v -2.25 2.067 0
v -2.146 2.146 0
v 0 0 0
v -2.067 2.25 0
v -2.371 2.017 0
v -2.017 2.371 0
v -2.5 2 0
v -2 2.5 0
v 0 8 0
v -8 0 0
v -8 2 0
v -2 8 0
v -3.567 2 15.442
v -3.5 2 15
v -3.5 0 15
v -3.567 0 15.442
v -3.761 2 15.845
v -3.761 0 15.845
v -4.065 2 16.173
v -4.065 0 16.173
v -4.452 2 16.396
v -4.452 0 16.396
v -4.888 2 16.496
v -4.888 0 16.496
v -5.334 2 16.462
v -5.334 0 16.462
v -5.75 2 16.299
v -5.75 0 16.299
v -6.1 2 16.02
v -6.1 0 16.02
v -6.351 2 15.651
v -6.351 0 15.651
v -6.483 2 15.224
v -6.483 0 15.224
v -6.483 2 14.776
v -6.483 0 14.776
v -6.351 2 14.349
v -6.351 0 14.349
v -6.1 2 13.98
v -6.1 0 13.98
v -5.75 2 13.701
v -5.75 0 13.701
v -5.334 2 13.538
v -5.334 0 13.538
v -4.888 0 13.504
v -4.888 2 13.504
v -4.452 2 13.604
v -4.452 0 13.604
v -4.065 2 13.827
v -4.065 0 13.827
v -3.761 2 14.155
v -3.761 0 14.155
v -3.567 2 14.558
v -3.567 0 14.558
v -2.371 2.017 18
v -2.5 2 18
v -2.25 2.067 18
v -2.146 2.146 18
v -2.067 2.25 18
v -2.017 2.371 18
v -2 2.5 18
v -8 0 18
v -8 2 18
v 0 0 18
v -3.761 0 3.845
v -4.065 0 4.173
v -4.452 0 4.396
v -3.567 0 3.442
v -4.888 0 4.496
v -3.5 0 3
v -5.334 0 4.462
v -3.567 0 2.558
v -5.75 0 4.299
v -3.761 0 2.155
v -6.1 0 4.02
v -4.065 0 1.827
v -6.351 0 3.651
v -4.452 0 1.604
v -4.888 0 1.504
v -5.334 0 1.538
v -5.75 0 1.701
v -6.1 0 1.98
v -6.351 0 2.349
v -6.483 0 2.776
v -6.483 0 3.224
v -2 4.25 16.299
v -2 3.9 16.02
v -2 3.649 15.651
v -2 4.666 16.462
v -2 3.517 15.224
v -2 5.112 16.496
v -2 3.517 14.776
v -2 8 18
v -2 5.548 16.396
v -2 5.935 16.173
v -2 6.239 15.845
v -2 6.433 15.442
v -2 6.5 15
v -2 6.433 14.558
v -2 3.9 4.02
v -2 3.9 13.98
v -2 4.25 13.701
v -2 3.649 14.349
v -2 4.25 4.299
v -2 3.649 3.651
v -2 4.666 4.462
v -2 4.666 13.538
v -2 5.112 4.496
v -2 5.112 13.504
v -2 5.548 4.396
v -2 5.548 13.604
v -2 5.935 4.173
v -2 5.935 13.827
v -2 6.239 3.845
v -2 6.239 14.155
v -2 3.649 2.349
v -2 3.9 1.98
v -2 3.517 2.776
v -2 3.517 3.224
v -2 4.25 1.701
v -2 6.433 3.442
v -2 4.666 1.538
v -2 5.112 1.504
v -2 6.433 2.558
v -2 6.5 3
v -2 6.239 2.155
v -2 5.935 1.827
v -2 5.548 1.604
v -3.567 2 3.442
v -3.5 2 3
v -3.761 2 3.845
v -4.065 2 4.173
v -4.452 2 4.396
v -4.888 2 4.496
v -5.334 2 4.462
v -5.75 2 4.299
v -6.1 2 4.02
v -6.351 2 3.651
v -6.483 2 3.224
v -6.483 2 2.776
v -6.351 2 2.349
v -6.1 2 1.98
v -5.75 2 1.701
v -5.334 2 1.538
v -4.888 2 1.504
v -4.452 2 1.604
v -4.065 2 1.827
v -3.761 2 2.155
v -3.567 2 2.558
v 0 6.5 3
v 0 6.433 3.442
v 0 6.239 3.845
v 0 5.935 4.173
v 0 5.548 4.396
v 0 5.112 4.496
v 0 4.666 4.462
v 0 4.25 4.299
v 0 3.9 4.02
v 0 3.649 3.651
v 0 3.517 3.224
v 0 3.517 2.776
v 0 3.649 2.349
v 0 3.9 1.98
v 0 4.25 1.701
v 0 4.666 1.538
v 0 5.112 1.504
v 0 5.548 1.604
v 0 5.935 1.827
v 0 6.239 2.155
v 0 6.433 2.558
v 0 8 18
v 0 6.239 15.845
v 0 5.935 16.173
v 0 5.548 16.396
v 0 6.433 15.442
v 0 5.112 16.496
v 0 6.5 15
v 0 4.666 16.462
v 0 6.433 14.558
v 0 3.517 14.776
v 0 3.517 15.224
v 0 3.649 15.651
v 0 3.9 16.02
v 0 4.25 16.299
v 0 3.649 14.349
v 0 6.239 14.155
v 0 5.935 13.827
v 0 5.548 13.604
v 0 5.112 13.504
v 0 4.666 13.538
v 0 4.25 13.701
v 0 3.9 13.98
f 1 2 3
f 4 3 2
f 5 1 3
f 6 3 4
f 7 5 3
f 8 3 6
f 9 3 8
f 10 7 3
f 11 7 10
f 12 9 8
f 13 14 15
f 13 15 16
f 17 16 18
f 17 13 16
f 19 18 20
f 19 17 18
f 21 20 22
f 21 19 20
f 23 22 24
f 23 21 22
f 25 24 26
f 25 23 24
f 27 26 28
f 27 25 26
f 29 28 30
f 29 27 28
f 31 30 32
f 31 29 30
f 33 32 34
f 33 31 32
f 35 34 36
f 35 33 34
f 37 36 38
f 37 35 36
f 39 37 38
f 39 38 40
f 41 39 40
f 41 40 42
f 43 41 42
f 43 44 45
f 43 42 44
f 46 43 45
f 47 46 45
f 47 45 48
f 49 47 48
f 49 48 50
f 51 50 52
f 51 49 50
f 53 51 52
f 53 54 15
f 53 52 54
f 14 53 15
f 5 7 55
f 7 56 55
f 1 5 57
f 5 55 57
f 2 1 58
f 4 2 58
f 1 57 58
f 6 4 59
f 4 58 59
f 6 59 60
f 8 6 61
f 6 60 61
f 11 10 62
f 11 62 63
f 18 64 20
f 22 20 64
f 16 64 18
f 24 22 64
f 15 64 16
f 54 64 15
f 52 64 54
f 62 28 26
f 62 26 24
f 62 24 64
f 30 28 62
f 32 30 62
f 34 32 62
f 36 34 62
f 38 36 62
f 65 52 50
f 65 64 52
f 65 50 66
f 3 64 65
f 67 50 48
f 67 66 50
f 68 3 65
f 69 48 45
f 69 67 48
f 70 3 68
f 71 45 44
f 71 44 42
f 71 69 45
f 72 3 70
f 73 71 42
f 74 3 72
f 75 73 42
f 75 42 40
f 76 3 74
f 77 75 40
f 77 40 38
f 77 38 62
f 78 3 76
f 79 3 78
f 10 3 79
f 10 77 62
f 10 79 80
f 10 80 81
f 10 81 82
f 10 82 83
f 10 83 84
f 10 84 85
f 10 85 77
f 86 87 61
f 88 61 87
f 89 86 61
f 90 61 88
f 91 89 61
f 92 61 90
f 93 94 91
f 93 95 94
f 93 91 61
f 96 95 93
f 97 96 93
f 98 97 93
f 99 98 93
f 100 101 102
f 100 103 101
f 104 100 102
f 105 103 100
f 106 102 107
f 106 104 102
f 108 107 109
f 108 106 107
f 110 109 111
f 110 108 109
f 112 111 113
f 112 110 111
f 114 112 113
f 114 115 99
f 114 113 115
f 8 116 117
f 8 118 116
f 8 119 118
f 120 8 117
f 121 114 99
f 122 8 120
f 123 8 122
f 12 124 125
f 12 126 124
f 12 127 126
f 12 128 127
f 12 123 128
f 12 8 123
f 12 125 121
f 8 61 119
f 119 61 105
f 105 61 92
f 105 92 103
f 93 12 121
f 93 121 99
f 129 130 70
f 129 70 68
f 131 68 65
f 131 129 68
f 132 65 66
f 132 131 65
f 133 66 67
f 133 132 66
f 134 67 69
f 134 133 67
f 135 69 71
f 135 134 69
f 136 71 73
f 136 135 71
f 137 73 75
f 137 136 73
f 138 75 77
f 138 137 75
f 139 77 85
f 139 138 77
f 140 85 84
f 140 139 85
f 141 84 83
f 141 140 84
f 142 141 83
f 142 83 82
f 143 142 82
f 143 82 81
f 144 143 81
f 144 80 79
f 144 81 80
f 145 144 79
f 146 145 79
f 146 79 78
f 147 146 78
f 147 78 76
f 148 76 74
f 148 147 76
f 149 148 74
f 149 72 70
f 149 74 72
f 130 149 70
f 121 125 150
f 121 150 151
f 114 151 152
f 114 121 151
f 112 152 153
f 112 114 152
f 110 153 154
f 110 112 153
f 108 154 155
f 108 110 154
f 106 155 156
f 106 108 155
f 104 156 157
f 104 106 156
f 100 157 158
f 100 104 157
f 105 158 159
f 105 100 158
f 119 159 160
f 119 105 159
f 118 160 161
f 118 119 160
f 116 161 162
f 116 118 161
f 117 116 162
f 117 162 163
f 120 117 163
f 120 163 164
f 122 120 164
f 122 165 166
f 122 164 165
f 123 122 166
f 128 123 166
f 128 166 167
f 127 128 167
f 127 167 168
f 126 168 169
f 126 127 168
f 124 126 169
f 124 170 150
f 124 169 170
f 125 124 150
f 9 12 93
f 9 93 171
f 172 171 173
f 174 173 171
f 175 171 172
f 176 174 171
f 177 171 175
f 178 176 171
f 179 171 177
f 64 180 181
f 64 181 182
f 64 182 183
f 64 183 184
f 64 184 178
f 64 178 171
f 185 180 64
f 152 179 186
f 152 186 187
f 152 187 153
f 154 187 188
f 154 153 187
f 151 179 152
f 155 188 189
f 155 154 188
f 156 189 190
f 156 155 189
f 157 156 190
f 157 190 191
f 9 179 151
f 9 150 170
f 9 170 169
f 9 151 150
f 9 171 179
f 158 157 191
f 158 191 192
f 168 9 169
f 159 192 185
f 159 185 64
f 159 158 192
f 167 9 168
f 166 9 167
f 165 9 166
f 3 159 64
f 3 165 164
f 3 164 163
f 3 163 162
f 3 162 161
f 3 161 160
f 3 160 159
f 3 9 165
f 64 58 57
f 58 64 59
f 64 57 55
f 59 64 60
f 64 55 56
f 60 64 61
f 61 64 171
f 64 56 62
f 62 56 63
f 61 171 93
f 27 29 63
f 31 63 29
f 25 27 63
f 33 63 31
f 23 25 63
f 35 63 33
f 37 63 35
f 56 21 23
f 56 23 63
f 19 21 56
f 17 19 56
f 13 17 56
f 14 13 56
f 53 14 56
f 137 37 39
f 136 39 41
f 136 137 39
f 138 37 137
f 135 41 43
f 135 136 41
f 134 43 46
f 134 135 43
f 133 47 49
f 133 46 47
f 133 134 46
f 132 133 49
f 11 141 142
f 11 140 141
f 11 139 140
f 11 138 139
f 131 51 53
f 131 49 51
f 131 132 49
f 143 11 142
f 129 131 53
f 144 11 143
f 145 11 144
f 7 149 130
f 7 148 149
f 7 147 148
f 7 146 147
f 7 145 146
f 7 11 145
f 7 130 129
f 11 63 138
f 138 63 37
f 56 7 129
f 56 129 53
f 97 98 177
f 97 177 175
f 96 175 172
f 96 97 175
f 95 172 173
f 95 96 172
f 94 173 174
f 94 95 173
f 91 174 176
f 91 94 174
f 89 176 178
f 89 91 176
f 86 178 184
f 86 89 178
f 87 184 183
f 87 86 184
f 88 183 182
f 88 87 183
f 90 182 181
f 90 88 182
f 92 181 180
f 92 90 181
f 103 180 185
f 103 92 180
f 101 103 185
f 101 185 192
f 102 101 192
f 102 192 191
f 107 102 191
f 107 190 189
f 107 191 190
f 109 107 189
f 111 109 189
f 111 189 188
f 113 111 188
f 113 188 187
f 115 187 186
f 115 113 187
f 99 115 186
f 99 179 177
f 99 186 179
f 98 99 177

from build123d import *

# Parameters (mm, degrees)
BOSS_EXTRUDE1_DEPTH     = 18
CUT_EXTRUDE1_DEPTH      = 22.260291625
CUT_EXTRUDE1_DEPTH_BACK = 22.260291625
SKETCH2_R               = 1.5
CUT_EXTRUDE2_DEPTH      = 22.260291625
CUT_EXTRUDE2_DEPTH_BACK = 22.260291625
SKETCH3_R               = 1.5
FILLET1_R               = 0.5


with BuildPart() as part:
    # Sketch1 → Boss-Extrude1 (new body)
    with BuildSketch(Plane.XY):
        Polygon((0, 0), (-8, 0), (-8, 2), (-2, 2), (-2, 8), (0, 8), align=None)
    extrude(amount=BOSS_EXTRUDE1_DEPTH)

    # Sketch2 → Cut-Extrude1 (cut, two sides: drawn at the far end of the back side and taken through both)
    with BuildSketch(Plane(origin=(0, 0, 0), x_dir=(0, 0, -1), z_dir=(1, 0, 0)).offset(-CUT_EXTRUDE1_DEPTH_BACK)):
        with Locations(Location((-15, 5, 0), (0, 0, 90))):
            Circle(SKETCH2_R)
        with Locations(Location((-3, 5, 0), (0, 0, 90))):
            Circle(SKETCH2_R)
    extrude(amount=CUT_EXTRUDE1_DEPTH + CUT_EXTRUDE1_DEPTH_BACK, mode=Mode.SUBTRACT)

    # Sketch3 → Cut-Extrude2 (cut, two sides: drawn at the far end of the back side and taken through both)
    with BuildSketch(Plane.XZ.offset(-CUT_EXTRUDE2_DEPTH_BACK)):
        with Locations((-5, 15)):
            Circle(SKETCH3_R)
        with Locations((-5, 3)):
            Circle(SKETCH3_R)
    extrude(amount=CUT_EXTRUDE2_DEPTH + CUT_EXTRUDE2_DEPTH_BACK, mode=Mode.SUBTRACT)

    # Fillet1
    fillet1_edges = [part.edges().sort_by_distance(p)[0] for p in [
        (-2, 2, 9),
    ]]
    fillet(fillet1_edges, radius=FILLET1_R)


solid = part.part
